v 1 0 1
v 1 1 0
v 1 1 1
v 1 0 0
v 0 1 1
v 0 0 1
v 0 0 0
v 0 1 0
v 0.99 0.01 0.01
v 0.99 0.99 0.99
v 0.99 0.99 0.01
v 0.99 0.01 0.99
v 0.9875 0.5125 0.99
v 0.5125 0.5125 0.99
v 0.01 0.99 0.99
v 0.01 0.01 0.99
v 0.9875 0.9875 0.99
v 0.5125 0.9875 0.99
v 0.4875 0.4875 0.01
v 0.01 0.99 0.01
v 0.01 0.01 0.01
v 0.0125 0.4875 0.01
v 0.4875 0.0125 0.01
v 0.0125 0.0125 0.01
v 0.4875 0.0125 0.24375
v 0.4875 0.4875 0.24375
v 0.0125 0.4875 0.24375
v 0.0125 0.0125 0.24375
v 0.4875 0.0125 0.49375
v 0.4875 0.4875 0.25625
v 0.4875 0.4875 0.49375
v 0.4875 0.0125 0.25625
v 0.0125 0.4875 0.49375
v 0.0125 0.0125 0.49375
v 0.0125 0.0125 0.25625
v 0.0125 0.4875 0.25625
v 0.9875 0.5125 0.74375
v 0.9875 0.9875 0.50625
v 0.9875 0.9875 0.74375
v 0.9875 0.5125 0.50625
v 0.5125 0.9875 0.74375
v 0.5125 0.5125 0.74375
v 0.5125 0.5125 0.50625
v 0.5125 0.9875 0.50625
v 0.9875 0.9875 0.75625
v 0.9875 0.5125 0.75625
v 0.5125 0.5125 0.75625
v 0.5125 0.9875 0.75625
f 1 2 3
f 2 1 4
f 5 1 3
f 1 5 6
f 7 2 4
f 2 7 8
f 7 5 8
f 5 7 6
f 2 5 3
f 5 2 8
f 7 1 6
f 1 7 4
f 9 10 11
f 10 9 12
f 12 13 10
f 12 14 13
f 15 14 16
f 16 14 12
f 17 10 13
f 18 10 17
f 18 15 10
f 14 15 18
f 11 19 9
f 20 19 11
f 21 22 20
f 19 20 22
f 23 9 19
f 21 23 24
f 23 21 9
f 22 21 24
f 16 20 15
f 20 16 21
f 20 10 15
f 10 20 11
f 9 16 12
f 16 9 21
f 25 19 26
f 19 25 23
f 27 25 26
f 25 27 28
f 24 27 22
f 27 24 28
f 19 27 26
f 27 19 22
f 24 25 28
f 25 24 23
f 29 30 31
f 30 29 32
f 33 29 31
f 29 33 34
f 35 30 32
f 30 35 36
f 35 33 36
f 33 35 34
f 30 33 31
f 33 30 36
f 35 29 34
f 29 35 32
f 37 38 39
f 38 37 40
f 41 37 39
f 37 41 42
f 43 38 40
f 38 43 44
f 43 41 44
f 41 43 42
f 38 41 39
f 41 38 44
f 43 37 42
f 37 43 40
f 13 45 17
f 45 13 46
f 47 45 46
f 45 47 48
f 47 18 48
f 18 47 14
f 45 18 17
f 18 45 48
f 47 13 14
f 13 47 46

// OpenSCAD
translate([0.25, 0.25, 0.125]) color([0.1671563832773839, 0.9156415011205408, 0.14610125416699637]) cube([0.475, 0.475, 0.2375], center=true);
translate([0.25, 0.25, 0.375]) color([0.019259966087643354, 0.789619530725427, 0.2294964637973682]) cube([0.475, 0.475, 0.2375], center=true);
translate([0.75, 0.75, 0.625]) color([0.17489738455220027, 0.4774992644938315, 0.21962003938095365]) cube([0.475, 0.475, 0.2375], center=true);
translate([0.75, 0.75, 0.875]) color([0.0525458139502446, 0.912512966765224, 0.0439065446633069]) cube([0.475, 0.475, 0.2375], center=true);
color([0.3,0.3,0.3,0.3]) difference() { cube([1,1,1]); translate([0.01,0.01,0.01]) cube([0.98,0.98,0.98]); }
